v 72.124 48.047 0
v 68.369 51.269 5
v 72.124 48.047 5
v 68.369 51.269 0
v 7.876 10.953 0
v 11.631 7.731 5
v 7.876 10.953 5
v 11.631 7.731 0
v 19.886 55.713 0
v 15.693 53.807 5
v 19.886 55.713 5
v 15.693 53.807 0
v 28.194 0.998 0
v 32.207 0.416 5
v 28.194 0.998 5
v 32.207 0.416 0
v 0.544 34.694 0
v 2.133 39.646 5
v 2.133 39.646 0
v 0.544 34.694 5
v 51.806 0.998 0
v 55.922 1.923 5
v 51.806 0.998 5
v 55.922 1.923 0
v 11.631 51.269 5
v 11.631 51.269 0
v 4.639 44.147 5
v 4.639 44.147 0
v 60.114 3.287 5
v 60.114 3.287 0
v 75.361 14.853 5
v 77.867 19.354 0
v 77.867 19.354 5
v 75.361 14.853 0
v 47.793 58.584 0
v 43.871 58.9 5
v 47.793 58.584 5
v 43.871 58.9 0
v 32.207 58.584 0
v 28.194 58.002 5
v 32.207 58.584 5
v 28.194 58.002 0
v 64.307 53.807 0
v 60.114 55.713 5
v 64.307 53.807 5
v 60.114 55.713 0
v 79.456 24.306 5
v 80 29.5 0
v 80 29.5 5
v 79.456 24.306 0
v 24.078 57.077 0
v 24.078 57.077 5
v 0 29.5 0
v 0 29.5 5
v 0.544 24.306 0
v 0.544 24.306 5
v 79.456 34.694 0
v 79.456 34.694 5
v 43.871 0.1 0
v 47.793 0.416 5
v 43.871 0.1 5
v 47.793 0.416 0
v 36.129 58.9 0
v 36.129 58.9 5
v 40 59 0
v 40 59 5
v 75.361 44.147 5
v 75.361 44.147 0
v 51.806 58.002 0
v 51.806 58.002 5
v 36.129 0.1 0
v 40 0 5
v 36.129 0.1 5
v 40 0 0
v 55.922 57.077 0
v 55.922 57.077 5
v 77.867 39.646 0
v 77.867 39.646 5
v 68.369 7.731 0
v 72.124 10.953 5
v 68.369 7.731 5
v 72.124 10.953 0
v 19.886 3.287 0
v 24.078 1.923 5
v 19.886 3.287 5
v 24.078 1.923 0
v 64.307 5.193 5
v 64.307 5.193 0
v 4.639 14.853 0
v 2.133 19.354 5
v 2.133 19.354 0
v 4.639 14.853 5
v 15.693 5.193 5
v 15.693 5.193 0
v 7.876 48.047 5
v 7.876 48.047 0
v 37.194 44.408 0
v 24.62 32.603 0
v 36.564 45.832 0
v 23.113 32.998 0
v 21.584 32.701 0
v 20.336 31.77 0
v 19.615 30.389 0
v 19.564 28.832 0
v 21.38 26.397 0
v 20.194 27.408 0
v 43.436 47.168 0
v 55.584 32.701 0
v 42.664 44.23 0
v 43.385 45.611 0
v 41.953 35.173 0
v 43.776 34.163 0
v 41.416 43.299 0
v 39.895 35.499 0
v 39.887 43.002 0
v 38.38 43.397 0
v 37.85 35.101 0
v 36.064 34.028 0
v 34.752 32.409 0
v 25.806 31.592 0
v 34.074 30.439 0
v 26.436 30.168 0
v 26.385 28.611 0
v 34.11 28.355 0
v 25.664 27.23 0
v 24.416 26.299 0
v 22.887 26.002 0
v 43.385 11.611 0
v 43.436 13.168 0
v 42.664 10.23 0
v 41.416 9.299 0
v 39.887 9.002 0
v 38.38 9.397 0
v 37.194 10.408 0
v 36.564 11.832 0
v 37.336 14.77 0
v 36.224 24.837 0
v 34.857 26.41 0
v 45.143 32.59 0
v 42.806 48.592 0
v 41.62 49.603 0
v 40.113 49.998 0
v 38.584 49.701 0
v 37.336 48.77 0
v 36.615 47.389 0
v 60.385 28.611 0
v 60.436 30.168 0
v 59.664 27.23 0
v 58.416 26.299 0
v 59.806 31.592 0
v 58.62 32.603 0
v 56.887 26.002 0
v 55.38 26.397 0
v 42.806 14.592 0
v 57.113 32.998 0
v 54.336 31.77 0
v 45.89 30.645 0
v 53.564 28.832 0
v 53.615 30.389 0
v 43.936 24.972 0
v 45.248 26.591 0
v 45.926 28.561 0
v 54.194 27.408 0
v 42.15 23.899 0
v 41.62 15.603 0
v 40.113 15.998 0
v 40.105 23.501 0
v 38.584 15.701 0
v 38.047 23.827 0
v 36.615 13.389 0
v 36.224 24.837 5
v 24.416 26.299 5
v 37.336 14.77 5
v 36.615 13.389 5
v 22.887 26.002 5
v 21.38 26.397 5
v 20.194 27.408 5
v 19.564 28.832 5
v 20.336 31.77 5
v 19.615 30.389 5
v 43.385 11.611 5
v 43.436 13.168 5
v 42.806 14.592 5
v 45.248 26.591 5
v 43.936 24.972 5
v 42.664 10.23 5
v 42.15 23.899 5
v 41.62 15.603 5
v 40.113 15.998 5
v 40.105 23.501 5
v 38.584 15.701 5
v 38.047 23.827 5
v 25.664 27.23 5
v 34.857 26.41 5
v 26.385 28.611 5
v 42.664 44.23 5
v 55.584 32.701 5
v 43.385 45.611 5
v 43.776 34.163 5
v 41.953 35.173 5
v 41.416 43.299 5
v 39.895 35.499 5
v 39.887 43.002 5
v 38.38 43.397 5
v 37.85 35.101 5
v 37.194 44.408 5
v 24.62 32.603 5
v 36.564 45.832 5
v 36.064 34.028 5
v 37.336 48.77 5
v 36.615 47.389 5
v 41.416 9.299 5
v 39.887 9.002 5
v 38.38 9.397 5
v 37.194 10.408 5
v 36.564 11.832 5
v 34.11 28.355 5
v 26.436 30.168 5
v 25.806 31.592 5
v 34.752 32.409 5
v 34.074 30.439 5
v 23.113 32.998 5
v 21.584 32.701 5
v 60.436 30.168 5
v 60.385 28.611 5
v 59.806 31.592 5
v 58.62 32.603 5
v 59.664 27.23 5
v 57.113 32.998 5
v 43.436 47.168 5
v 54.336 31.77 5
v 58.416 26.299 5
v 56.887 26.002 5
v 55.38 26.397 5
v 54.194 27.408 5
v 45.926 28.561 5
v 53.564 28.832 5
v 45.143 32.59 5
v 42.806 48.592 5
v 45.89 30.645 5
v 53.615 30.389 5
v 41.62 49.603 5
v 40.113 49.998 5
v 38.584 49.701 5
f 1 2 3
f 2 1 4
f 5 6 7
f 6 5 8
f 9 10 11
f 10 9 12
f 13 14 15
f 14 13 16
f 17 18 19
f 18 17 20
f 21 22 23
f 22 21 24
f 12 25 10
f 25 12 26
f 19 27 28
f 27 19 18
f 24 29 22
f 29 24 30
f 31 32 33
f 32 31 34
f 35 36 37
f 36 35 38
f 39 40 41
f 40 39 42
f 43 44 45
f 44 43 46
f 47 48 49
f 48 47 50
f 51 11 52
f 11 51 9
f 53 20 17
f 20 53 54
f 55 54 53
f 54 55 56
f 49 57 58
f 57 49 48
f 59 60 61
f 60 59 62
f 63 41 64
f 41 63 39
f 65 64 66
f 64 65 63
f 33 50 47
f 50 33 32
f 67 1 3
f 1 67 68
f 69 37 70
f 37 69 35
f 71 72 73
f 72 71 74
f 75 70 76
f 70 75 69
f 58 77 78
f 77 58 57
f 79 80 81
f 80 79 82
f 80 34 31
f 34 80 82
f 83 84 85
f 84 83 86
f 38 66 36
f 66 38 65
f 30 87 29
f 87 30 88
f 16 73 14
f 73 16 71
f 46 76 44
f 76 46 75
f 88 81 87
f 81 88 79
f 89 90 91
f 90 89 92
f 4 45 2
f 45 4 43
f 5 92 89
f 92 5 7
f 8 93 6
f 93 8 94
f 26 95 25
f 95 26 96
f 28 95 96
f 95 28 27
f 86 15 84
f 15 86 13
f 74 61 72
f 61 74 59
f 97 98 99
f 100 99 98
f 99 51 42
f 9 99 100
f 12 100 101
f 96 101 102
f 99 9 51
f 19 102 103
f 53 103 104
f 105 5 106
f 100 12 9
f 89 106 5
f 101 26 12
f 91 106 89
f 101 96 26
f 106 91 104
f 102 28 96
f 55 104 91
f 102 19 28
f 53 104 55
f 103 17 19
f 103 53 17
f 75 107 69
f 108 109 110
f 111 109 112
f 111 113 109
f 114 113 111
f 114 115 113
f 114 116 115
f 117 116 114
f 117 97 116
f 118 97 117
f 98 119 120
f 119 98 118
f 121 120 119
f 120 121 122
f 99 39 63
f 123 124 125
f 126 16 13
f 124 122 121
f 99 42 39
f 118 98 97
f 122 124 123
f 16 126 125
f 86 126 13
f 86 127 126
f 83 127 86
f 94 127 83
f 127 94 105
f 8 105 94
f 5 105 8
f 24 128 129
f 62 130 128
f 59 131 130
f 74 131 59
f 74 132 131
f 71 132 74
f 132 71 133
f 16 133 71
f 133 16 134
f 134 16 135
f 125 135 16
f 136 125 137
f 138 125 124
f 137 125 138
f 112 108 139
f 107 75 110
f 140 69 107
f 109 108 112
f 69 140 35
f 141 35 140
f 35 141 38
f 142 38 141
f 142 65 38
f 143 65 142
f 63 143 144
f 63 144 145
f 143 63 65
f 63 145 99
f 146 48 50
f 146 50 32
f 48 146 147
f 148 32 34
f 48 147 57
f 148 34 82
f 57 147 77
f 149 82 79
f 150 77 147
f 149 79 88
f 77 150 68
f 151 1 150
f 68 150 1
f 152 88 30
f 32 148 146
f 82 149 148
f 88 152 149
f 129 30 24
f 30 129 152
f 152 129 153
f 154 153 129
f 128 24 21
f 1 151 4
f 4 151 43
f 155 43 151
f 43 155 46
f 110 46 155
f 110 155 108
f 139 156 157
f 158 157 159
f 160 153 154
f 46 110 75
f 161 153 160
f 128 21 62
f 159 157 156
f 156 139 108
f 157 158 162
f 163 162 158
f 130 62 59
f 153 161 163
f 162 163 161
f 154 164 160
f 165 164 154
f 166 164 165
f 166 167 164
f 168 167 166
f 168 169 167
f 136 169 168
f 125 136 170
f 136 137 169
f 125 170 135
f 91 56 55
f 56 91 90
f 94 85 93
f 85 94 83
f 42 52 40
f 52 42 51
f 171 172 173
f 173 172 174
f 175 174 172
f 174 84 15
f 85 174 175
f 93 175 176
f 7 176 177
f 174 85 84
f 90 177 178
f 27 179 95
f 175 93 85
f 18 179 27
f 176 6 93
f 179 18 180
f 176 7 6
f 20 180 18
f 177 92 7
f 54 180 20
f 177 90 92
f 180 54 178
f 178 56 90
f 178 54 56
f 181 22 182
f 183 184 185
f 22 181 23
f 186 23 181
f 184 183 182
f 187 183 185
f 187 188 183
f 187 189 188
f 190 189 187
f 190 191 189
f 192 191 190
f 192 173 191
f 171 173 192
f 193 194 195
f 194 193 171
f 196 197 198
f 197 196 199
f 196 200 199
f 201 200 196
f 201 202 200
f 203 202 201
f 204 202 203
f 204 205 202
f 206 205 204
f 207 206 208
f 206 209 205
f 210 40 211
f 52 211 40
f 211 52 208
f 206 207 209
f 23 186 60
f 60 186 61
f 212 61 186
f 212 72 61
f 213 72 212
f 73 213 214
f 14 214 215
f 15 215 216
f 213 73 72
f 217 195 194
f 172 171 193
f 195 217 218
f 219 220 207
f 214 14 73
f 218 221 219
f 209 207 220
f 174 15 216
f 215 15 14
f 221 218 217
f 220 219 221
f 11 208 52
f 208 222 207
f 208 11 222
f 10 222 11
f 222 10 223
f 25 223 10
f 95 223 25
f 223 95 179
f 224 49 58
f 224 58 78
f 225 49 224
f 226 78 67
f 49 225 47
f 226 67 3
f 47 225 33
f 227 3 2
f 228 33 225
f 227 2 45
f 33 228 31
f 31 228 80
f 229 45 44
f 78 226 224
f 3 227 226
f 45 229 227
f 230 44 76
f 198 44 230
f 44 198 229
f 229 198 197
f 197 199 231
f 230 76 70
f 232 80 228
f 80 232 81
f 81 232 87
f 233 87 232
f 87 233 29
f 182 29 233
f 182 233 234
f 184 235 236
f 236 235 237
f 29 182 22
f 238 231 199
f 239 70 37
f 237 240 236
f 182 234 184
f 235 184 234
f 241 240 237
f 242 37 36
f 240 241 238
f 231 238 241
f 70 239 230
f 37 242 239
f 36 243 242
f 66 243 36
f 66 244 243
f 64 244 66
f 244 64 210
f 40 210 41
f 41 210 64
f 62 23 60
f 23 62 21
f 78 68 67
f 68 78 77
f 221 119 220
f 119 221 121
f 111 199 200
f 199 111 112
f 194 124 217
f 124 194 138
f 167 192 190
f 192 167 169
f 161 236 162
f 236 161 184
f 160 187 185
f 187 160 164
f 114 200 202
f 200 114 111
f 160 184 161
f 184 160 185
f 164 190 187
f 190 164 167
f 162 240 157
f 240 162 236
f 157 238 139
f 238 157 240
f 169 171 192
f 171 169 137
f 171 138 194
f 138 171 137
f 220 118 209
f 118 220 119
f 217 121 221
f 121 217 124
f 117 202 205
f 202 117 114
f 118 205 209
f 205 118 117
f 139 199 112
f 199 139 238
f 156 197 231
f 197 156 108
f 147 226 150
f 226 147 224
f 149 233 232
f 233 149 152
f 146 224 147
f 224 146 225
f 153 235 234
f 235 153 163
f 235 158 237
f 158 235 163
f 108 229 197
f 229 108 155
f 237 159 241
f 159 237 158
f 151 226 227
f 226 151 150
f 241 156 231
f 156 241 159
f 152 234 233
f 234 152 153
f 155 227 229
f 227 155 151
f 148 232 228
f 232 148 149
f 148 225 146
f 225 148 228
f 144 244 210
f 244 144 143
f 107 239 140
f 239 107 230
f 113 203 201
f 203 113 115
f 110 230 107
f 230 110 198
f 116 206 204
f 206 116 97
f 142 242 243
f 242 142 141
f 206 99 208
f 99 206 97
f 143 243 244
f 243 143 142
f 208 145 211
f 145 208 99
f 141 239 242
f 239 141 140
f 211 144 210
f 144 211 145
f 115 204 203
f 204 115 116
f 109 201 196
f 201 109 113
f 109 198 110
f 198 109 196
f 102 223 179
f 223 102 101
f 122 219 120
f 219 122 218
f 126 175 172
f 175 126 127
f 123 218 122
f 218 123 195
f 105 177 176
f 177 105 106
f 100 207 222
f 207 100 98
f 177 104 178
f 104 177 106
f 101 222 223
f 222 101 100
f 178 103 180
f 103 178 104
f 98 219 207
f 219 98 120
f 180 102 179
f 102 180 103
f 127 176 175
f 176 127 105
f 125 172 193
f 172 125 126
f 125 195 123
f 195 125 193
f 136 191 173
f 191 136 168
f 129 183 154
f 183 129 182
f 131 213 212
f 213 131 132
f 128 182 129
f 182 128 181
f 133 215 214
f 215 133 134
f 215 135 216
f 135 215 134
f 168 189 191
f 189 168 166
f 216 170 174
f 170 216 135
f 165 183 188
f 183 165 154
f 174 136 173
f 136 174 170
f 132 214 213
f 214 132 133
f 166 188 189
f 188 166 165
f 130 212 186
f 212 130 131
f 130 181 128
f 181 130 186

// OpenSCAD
$fn = 32;

// ----------------------------------------------------------------------
// Cam plate: double_lobe cam, base R28
// ----------------------------------------------------------------------

// --- parameters (mm) ---
base_r = 28;              // base circle radius
lobe_h = 12;              // cam lobe rise
bore_r = 6;               // shaft bore radius
plate_t = 5;              // plate thickness, Z (extrusion height)
ring_r = 17;              // lightening ring radius
bolt_r = 3.5;             // lightening hole radius
fit_tol = 0.05;           // declared fit tolerance (prompt contract)
free_tol = 0.3;           // declared free tolerance (prompt contract)

profile = [[80, 29.5], [79.456, 34.694], [77.867, 39.646], [75.361, 44.147], [72.124, 48.047], [68.369, 51.269], [64.307, 53.807], [60.114, 55.713], [55.922, 57.077], [51.806, 58.002], [47.793, 58.584], [43.871, 58.9], [40, 59], [36.129, 58.9], [32.207, 58.584], [28.194, 58.002], [24.078, 57.077], [19.886, 55.713], [15.693, 53.807], [11.631, 51.269], [7.876, 48.047], [4.639, 44.147], [2.133, 39.646], [0.544, 34.694], [0, 29.5], [0.544, 24.306], [2.133, 19.354], [4.639, 14.853], [7.876, 10.953], [11.631, 7.731], [15.693, 5.193], [19.886, 3.287], [24.078, 1.923], [28.194, 0.998], [32.207, 0.416], [36.129, 0.1], [40, 0], [43.871, 0.1], [47.793, 0.416], [51.806, 0.998], [55.922, 1.923], [60.114, 3.287], [64.307, 5.193], [68.369, 7.731], [72.124, 10.953], [75.361, 14.853], [77.867, 19.354], [79.456, 24.306]];  // primary outline, 48 points, counter clockwise
void_1 = [[45.89, 30.645], [45.143, 32.59], [43.776, 34.163], [41.953, 35.173], [39.895, 35.499], [37.85, 35.101], [36.064, 34.028], [34.752, 32.409], [34.074, 30.439], [34.11, 28.355], [34.857, 26.41], [36.224, 24.837], [38.047, 23.827], [40.105, 23.501], [42.15, 23.899], [43.936, 24.972], [45.248, 26.591], [45.926, 28.561]];  // shaft bore, 18 points
void_2 = [[60.436, 30.168], [59.806, 31.592], [58.62, 32.603], [57.113, 32.998], [55.584, 32.701], [54.336, 31.77], [53.615, 30.389], [53.564, 28.832], [54.194, 27.408], [55.38, 26.397], [56.887, 26.002], [58.416, 26.299], [59.664, 27.23], [60.385, 28.611]];  // lightening hole 1, 14 points
void_3 = [[43.436, 47.168], [42.806, 48.592], [41.62, 49.603], [40.113, 49.998], [38.584, 49.701], [37.336, 48.77], [36.615, 47.389], [36.564, 45.832], [37.194, 44.408], [38.38, 43.397], [39.887, 43.002], [41.416, 43.299], [42.664, 44.23], [43.385, 45.611]];  // lightening hole 2, 14 points
void_4 = [[26.436, 30.168], [25.806, 31.592], [24.62, 32.603], [23.113, 32.998], [21.584, 32.701], [20.336, 31.77], [19.615, 30.389], [19.564, 28.832], [20.194, 27.408], [21.38, 26.397], [22.887, 26.002], [24.416, 26.299], [25.664, 27.23], [26.385, 28.611]];  // lightening hole 3, 14 points
void_5 = [[43.436, 13.168], [42.806, 14.592], [41.62, 15.603], [40.113, 15.998], [38.584, 15.701], [37.336, 14.77], [36.615, 13.389], [36.564, 11.832], [37.194, 10.408], [38.38, 9.397], [39.887, 9.002], [41.416, 9.299], [42.664, 10.23], [43.385, 11.611]];  // lightening hole 4, 14 points

// --- the one profile operation ---
difference() {
  linear_extrude(height = plate_t) polygon(points = profile);
  translate([0, 0, -1])
    linear_extrude(height = plate_t + 2) polygon(points = void_1);
  translate([0, 0, -1])
    linear_extrude(height = plate_t + 2) polygon(points = void_2);
  translate([0, 0, -1])
    linear_extrude(height = plate_t + 2) polygon(points = void_3);
  translate([0, 0, -1])
    linear_extrude(height = plate_t + 2) polygon(points = void_4);
  translate([0, 0, -1])
    linear_extrude(height = plate_t + 2) polygon(points = void_5);
}
